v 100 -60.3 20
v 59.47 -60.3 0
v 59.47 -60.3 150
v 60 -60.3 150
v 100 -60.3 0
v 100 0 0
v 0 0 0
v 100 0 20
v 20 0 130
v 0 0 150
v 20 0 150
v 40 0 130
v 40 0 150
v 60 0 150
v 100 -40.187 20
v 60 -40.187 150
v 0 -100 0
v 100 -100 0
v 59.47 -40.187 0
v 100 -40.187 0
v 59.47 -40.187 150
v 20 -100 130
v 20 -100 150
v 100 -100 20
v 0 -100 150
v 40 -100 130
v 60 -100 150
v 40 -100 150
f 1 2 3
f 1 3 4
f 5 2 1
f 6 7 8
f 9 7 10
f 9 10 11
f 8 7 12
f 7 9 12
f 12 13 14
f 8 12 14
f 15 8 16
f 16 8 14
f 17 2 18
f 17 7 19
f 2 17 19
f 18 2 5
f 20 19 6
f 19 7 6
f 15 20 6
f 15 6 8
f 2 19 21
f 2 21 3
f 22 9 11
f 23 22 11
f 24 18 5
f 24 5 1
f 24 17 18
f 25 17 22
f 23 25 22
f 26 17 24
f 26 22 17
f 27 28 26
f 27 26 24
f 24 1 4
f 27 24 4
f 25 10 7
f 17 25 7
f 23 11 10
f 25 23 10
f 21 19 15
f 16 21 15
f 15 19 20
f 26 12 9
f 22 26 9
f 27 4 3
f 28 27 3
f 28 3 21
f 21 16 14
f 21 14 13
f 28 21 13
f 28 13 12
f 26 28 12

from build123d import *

# Parameters (mm, degrees)
F1_DEPTH = 100
F2_W     = 40.5296184123
F2_H     = 20.1131775975
F3_DEPTH = 100
F4_DEPTH = 100


with BuildPart() as f1:
    # F0 (on Front) → F1 (new body)
    with BuildSketch(Plane.XZ):
        Polygon((0, 150), (0, 0), (100, 0), (100, 20), (60, 150), (40, 150), (40, 130), (20, 130), (20, 150), align=None)
    extrude(amount=F1_DEPTH)

    # F2 (on face) → F3 (cut)
    with BuildSketch(Plane(origin=(0, 0, 0), x_dir=(1, 0, 0), z_dir=(0, 0, -1))):
        with Locations((79.7351907939, 50.2432435751)):
            Rectangle(F2_W, F2_H)
    extrude(amount=-F3_DEPTH, mode=Mode.SUBTRACT)

    # F4 (cut): a face of the model
    f4_faces = [f1.faces().sort_by_distance(p)[0] for p in [
        (67.4274984862, -50.2432435751, 100),
    ]]
    extrude(f4_faces, amount=-F4_DEPTH, mode=Mode.SUBTRACT)


solid = f1.part
